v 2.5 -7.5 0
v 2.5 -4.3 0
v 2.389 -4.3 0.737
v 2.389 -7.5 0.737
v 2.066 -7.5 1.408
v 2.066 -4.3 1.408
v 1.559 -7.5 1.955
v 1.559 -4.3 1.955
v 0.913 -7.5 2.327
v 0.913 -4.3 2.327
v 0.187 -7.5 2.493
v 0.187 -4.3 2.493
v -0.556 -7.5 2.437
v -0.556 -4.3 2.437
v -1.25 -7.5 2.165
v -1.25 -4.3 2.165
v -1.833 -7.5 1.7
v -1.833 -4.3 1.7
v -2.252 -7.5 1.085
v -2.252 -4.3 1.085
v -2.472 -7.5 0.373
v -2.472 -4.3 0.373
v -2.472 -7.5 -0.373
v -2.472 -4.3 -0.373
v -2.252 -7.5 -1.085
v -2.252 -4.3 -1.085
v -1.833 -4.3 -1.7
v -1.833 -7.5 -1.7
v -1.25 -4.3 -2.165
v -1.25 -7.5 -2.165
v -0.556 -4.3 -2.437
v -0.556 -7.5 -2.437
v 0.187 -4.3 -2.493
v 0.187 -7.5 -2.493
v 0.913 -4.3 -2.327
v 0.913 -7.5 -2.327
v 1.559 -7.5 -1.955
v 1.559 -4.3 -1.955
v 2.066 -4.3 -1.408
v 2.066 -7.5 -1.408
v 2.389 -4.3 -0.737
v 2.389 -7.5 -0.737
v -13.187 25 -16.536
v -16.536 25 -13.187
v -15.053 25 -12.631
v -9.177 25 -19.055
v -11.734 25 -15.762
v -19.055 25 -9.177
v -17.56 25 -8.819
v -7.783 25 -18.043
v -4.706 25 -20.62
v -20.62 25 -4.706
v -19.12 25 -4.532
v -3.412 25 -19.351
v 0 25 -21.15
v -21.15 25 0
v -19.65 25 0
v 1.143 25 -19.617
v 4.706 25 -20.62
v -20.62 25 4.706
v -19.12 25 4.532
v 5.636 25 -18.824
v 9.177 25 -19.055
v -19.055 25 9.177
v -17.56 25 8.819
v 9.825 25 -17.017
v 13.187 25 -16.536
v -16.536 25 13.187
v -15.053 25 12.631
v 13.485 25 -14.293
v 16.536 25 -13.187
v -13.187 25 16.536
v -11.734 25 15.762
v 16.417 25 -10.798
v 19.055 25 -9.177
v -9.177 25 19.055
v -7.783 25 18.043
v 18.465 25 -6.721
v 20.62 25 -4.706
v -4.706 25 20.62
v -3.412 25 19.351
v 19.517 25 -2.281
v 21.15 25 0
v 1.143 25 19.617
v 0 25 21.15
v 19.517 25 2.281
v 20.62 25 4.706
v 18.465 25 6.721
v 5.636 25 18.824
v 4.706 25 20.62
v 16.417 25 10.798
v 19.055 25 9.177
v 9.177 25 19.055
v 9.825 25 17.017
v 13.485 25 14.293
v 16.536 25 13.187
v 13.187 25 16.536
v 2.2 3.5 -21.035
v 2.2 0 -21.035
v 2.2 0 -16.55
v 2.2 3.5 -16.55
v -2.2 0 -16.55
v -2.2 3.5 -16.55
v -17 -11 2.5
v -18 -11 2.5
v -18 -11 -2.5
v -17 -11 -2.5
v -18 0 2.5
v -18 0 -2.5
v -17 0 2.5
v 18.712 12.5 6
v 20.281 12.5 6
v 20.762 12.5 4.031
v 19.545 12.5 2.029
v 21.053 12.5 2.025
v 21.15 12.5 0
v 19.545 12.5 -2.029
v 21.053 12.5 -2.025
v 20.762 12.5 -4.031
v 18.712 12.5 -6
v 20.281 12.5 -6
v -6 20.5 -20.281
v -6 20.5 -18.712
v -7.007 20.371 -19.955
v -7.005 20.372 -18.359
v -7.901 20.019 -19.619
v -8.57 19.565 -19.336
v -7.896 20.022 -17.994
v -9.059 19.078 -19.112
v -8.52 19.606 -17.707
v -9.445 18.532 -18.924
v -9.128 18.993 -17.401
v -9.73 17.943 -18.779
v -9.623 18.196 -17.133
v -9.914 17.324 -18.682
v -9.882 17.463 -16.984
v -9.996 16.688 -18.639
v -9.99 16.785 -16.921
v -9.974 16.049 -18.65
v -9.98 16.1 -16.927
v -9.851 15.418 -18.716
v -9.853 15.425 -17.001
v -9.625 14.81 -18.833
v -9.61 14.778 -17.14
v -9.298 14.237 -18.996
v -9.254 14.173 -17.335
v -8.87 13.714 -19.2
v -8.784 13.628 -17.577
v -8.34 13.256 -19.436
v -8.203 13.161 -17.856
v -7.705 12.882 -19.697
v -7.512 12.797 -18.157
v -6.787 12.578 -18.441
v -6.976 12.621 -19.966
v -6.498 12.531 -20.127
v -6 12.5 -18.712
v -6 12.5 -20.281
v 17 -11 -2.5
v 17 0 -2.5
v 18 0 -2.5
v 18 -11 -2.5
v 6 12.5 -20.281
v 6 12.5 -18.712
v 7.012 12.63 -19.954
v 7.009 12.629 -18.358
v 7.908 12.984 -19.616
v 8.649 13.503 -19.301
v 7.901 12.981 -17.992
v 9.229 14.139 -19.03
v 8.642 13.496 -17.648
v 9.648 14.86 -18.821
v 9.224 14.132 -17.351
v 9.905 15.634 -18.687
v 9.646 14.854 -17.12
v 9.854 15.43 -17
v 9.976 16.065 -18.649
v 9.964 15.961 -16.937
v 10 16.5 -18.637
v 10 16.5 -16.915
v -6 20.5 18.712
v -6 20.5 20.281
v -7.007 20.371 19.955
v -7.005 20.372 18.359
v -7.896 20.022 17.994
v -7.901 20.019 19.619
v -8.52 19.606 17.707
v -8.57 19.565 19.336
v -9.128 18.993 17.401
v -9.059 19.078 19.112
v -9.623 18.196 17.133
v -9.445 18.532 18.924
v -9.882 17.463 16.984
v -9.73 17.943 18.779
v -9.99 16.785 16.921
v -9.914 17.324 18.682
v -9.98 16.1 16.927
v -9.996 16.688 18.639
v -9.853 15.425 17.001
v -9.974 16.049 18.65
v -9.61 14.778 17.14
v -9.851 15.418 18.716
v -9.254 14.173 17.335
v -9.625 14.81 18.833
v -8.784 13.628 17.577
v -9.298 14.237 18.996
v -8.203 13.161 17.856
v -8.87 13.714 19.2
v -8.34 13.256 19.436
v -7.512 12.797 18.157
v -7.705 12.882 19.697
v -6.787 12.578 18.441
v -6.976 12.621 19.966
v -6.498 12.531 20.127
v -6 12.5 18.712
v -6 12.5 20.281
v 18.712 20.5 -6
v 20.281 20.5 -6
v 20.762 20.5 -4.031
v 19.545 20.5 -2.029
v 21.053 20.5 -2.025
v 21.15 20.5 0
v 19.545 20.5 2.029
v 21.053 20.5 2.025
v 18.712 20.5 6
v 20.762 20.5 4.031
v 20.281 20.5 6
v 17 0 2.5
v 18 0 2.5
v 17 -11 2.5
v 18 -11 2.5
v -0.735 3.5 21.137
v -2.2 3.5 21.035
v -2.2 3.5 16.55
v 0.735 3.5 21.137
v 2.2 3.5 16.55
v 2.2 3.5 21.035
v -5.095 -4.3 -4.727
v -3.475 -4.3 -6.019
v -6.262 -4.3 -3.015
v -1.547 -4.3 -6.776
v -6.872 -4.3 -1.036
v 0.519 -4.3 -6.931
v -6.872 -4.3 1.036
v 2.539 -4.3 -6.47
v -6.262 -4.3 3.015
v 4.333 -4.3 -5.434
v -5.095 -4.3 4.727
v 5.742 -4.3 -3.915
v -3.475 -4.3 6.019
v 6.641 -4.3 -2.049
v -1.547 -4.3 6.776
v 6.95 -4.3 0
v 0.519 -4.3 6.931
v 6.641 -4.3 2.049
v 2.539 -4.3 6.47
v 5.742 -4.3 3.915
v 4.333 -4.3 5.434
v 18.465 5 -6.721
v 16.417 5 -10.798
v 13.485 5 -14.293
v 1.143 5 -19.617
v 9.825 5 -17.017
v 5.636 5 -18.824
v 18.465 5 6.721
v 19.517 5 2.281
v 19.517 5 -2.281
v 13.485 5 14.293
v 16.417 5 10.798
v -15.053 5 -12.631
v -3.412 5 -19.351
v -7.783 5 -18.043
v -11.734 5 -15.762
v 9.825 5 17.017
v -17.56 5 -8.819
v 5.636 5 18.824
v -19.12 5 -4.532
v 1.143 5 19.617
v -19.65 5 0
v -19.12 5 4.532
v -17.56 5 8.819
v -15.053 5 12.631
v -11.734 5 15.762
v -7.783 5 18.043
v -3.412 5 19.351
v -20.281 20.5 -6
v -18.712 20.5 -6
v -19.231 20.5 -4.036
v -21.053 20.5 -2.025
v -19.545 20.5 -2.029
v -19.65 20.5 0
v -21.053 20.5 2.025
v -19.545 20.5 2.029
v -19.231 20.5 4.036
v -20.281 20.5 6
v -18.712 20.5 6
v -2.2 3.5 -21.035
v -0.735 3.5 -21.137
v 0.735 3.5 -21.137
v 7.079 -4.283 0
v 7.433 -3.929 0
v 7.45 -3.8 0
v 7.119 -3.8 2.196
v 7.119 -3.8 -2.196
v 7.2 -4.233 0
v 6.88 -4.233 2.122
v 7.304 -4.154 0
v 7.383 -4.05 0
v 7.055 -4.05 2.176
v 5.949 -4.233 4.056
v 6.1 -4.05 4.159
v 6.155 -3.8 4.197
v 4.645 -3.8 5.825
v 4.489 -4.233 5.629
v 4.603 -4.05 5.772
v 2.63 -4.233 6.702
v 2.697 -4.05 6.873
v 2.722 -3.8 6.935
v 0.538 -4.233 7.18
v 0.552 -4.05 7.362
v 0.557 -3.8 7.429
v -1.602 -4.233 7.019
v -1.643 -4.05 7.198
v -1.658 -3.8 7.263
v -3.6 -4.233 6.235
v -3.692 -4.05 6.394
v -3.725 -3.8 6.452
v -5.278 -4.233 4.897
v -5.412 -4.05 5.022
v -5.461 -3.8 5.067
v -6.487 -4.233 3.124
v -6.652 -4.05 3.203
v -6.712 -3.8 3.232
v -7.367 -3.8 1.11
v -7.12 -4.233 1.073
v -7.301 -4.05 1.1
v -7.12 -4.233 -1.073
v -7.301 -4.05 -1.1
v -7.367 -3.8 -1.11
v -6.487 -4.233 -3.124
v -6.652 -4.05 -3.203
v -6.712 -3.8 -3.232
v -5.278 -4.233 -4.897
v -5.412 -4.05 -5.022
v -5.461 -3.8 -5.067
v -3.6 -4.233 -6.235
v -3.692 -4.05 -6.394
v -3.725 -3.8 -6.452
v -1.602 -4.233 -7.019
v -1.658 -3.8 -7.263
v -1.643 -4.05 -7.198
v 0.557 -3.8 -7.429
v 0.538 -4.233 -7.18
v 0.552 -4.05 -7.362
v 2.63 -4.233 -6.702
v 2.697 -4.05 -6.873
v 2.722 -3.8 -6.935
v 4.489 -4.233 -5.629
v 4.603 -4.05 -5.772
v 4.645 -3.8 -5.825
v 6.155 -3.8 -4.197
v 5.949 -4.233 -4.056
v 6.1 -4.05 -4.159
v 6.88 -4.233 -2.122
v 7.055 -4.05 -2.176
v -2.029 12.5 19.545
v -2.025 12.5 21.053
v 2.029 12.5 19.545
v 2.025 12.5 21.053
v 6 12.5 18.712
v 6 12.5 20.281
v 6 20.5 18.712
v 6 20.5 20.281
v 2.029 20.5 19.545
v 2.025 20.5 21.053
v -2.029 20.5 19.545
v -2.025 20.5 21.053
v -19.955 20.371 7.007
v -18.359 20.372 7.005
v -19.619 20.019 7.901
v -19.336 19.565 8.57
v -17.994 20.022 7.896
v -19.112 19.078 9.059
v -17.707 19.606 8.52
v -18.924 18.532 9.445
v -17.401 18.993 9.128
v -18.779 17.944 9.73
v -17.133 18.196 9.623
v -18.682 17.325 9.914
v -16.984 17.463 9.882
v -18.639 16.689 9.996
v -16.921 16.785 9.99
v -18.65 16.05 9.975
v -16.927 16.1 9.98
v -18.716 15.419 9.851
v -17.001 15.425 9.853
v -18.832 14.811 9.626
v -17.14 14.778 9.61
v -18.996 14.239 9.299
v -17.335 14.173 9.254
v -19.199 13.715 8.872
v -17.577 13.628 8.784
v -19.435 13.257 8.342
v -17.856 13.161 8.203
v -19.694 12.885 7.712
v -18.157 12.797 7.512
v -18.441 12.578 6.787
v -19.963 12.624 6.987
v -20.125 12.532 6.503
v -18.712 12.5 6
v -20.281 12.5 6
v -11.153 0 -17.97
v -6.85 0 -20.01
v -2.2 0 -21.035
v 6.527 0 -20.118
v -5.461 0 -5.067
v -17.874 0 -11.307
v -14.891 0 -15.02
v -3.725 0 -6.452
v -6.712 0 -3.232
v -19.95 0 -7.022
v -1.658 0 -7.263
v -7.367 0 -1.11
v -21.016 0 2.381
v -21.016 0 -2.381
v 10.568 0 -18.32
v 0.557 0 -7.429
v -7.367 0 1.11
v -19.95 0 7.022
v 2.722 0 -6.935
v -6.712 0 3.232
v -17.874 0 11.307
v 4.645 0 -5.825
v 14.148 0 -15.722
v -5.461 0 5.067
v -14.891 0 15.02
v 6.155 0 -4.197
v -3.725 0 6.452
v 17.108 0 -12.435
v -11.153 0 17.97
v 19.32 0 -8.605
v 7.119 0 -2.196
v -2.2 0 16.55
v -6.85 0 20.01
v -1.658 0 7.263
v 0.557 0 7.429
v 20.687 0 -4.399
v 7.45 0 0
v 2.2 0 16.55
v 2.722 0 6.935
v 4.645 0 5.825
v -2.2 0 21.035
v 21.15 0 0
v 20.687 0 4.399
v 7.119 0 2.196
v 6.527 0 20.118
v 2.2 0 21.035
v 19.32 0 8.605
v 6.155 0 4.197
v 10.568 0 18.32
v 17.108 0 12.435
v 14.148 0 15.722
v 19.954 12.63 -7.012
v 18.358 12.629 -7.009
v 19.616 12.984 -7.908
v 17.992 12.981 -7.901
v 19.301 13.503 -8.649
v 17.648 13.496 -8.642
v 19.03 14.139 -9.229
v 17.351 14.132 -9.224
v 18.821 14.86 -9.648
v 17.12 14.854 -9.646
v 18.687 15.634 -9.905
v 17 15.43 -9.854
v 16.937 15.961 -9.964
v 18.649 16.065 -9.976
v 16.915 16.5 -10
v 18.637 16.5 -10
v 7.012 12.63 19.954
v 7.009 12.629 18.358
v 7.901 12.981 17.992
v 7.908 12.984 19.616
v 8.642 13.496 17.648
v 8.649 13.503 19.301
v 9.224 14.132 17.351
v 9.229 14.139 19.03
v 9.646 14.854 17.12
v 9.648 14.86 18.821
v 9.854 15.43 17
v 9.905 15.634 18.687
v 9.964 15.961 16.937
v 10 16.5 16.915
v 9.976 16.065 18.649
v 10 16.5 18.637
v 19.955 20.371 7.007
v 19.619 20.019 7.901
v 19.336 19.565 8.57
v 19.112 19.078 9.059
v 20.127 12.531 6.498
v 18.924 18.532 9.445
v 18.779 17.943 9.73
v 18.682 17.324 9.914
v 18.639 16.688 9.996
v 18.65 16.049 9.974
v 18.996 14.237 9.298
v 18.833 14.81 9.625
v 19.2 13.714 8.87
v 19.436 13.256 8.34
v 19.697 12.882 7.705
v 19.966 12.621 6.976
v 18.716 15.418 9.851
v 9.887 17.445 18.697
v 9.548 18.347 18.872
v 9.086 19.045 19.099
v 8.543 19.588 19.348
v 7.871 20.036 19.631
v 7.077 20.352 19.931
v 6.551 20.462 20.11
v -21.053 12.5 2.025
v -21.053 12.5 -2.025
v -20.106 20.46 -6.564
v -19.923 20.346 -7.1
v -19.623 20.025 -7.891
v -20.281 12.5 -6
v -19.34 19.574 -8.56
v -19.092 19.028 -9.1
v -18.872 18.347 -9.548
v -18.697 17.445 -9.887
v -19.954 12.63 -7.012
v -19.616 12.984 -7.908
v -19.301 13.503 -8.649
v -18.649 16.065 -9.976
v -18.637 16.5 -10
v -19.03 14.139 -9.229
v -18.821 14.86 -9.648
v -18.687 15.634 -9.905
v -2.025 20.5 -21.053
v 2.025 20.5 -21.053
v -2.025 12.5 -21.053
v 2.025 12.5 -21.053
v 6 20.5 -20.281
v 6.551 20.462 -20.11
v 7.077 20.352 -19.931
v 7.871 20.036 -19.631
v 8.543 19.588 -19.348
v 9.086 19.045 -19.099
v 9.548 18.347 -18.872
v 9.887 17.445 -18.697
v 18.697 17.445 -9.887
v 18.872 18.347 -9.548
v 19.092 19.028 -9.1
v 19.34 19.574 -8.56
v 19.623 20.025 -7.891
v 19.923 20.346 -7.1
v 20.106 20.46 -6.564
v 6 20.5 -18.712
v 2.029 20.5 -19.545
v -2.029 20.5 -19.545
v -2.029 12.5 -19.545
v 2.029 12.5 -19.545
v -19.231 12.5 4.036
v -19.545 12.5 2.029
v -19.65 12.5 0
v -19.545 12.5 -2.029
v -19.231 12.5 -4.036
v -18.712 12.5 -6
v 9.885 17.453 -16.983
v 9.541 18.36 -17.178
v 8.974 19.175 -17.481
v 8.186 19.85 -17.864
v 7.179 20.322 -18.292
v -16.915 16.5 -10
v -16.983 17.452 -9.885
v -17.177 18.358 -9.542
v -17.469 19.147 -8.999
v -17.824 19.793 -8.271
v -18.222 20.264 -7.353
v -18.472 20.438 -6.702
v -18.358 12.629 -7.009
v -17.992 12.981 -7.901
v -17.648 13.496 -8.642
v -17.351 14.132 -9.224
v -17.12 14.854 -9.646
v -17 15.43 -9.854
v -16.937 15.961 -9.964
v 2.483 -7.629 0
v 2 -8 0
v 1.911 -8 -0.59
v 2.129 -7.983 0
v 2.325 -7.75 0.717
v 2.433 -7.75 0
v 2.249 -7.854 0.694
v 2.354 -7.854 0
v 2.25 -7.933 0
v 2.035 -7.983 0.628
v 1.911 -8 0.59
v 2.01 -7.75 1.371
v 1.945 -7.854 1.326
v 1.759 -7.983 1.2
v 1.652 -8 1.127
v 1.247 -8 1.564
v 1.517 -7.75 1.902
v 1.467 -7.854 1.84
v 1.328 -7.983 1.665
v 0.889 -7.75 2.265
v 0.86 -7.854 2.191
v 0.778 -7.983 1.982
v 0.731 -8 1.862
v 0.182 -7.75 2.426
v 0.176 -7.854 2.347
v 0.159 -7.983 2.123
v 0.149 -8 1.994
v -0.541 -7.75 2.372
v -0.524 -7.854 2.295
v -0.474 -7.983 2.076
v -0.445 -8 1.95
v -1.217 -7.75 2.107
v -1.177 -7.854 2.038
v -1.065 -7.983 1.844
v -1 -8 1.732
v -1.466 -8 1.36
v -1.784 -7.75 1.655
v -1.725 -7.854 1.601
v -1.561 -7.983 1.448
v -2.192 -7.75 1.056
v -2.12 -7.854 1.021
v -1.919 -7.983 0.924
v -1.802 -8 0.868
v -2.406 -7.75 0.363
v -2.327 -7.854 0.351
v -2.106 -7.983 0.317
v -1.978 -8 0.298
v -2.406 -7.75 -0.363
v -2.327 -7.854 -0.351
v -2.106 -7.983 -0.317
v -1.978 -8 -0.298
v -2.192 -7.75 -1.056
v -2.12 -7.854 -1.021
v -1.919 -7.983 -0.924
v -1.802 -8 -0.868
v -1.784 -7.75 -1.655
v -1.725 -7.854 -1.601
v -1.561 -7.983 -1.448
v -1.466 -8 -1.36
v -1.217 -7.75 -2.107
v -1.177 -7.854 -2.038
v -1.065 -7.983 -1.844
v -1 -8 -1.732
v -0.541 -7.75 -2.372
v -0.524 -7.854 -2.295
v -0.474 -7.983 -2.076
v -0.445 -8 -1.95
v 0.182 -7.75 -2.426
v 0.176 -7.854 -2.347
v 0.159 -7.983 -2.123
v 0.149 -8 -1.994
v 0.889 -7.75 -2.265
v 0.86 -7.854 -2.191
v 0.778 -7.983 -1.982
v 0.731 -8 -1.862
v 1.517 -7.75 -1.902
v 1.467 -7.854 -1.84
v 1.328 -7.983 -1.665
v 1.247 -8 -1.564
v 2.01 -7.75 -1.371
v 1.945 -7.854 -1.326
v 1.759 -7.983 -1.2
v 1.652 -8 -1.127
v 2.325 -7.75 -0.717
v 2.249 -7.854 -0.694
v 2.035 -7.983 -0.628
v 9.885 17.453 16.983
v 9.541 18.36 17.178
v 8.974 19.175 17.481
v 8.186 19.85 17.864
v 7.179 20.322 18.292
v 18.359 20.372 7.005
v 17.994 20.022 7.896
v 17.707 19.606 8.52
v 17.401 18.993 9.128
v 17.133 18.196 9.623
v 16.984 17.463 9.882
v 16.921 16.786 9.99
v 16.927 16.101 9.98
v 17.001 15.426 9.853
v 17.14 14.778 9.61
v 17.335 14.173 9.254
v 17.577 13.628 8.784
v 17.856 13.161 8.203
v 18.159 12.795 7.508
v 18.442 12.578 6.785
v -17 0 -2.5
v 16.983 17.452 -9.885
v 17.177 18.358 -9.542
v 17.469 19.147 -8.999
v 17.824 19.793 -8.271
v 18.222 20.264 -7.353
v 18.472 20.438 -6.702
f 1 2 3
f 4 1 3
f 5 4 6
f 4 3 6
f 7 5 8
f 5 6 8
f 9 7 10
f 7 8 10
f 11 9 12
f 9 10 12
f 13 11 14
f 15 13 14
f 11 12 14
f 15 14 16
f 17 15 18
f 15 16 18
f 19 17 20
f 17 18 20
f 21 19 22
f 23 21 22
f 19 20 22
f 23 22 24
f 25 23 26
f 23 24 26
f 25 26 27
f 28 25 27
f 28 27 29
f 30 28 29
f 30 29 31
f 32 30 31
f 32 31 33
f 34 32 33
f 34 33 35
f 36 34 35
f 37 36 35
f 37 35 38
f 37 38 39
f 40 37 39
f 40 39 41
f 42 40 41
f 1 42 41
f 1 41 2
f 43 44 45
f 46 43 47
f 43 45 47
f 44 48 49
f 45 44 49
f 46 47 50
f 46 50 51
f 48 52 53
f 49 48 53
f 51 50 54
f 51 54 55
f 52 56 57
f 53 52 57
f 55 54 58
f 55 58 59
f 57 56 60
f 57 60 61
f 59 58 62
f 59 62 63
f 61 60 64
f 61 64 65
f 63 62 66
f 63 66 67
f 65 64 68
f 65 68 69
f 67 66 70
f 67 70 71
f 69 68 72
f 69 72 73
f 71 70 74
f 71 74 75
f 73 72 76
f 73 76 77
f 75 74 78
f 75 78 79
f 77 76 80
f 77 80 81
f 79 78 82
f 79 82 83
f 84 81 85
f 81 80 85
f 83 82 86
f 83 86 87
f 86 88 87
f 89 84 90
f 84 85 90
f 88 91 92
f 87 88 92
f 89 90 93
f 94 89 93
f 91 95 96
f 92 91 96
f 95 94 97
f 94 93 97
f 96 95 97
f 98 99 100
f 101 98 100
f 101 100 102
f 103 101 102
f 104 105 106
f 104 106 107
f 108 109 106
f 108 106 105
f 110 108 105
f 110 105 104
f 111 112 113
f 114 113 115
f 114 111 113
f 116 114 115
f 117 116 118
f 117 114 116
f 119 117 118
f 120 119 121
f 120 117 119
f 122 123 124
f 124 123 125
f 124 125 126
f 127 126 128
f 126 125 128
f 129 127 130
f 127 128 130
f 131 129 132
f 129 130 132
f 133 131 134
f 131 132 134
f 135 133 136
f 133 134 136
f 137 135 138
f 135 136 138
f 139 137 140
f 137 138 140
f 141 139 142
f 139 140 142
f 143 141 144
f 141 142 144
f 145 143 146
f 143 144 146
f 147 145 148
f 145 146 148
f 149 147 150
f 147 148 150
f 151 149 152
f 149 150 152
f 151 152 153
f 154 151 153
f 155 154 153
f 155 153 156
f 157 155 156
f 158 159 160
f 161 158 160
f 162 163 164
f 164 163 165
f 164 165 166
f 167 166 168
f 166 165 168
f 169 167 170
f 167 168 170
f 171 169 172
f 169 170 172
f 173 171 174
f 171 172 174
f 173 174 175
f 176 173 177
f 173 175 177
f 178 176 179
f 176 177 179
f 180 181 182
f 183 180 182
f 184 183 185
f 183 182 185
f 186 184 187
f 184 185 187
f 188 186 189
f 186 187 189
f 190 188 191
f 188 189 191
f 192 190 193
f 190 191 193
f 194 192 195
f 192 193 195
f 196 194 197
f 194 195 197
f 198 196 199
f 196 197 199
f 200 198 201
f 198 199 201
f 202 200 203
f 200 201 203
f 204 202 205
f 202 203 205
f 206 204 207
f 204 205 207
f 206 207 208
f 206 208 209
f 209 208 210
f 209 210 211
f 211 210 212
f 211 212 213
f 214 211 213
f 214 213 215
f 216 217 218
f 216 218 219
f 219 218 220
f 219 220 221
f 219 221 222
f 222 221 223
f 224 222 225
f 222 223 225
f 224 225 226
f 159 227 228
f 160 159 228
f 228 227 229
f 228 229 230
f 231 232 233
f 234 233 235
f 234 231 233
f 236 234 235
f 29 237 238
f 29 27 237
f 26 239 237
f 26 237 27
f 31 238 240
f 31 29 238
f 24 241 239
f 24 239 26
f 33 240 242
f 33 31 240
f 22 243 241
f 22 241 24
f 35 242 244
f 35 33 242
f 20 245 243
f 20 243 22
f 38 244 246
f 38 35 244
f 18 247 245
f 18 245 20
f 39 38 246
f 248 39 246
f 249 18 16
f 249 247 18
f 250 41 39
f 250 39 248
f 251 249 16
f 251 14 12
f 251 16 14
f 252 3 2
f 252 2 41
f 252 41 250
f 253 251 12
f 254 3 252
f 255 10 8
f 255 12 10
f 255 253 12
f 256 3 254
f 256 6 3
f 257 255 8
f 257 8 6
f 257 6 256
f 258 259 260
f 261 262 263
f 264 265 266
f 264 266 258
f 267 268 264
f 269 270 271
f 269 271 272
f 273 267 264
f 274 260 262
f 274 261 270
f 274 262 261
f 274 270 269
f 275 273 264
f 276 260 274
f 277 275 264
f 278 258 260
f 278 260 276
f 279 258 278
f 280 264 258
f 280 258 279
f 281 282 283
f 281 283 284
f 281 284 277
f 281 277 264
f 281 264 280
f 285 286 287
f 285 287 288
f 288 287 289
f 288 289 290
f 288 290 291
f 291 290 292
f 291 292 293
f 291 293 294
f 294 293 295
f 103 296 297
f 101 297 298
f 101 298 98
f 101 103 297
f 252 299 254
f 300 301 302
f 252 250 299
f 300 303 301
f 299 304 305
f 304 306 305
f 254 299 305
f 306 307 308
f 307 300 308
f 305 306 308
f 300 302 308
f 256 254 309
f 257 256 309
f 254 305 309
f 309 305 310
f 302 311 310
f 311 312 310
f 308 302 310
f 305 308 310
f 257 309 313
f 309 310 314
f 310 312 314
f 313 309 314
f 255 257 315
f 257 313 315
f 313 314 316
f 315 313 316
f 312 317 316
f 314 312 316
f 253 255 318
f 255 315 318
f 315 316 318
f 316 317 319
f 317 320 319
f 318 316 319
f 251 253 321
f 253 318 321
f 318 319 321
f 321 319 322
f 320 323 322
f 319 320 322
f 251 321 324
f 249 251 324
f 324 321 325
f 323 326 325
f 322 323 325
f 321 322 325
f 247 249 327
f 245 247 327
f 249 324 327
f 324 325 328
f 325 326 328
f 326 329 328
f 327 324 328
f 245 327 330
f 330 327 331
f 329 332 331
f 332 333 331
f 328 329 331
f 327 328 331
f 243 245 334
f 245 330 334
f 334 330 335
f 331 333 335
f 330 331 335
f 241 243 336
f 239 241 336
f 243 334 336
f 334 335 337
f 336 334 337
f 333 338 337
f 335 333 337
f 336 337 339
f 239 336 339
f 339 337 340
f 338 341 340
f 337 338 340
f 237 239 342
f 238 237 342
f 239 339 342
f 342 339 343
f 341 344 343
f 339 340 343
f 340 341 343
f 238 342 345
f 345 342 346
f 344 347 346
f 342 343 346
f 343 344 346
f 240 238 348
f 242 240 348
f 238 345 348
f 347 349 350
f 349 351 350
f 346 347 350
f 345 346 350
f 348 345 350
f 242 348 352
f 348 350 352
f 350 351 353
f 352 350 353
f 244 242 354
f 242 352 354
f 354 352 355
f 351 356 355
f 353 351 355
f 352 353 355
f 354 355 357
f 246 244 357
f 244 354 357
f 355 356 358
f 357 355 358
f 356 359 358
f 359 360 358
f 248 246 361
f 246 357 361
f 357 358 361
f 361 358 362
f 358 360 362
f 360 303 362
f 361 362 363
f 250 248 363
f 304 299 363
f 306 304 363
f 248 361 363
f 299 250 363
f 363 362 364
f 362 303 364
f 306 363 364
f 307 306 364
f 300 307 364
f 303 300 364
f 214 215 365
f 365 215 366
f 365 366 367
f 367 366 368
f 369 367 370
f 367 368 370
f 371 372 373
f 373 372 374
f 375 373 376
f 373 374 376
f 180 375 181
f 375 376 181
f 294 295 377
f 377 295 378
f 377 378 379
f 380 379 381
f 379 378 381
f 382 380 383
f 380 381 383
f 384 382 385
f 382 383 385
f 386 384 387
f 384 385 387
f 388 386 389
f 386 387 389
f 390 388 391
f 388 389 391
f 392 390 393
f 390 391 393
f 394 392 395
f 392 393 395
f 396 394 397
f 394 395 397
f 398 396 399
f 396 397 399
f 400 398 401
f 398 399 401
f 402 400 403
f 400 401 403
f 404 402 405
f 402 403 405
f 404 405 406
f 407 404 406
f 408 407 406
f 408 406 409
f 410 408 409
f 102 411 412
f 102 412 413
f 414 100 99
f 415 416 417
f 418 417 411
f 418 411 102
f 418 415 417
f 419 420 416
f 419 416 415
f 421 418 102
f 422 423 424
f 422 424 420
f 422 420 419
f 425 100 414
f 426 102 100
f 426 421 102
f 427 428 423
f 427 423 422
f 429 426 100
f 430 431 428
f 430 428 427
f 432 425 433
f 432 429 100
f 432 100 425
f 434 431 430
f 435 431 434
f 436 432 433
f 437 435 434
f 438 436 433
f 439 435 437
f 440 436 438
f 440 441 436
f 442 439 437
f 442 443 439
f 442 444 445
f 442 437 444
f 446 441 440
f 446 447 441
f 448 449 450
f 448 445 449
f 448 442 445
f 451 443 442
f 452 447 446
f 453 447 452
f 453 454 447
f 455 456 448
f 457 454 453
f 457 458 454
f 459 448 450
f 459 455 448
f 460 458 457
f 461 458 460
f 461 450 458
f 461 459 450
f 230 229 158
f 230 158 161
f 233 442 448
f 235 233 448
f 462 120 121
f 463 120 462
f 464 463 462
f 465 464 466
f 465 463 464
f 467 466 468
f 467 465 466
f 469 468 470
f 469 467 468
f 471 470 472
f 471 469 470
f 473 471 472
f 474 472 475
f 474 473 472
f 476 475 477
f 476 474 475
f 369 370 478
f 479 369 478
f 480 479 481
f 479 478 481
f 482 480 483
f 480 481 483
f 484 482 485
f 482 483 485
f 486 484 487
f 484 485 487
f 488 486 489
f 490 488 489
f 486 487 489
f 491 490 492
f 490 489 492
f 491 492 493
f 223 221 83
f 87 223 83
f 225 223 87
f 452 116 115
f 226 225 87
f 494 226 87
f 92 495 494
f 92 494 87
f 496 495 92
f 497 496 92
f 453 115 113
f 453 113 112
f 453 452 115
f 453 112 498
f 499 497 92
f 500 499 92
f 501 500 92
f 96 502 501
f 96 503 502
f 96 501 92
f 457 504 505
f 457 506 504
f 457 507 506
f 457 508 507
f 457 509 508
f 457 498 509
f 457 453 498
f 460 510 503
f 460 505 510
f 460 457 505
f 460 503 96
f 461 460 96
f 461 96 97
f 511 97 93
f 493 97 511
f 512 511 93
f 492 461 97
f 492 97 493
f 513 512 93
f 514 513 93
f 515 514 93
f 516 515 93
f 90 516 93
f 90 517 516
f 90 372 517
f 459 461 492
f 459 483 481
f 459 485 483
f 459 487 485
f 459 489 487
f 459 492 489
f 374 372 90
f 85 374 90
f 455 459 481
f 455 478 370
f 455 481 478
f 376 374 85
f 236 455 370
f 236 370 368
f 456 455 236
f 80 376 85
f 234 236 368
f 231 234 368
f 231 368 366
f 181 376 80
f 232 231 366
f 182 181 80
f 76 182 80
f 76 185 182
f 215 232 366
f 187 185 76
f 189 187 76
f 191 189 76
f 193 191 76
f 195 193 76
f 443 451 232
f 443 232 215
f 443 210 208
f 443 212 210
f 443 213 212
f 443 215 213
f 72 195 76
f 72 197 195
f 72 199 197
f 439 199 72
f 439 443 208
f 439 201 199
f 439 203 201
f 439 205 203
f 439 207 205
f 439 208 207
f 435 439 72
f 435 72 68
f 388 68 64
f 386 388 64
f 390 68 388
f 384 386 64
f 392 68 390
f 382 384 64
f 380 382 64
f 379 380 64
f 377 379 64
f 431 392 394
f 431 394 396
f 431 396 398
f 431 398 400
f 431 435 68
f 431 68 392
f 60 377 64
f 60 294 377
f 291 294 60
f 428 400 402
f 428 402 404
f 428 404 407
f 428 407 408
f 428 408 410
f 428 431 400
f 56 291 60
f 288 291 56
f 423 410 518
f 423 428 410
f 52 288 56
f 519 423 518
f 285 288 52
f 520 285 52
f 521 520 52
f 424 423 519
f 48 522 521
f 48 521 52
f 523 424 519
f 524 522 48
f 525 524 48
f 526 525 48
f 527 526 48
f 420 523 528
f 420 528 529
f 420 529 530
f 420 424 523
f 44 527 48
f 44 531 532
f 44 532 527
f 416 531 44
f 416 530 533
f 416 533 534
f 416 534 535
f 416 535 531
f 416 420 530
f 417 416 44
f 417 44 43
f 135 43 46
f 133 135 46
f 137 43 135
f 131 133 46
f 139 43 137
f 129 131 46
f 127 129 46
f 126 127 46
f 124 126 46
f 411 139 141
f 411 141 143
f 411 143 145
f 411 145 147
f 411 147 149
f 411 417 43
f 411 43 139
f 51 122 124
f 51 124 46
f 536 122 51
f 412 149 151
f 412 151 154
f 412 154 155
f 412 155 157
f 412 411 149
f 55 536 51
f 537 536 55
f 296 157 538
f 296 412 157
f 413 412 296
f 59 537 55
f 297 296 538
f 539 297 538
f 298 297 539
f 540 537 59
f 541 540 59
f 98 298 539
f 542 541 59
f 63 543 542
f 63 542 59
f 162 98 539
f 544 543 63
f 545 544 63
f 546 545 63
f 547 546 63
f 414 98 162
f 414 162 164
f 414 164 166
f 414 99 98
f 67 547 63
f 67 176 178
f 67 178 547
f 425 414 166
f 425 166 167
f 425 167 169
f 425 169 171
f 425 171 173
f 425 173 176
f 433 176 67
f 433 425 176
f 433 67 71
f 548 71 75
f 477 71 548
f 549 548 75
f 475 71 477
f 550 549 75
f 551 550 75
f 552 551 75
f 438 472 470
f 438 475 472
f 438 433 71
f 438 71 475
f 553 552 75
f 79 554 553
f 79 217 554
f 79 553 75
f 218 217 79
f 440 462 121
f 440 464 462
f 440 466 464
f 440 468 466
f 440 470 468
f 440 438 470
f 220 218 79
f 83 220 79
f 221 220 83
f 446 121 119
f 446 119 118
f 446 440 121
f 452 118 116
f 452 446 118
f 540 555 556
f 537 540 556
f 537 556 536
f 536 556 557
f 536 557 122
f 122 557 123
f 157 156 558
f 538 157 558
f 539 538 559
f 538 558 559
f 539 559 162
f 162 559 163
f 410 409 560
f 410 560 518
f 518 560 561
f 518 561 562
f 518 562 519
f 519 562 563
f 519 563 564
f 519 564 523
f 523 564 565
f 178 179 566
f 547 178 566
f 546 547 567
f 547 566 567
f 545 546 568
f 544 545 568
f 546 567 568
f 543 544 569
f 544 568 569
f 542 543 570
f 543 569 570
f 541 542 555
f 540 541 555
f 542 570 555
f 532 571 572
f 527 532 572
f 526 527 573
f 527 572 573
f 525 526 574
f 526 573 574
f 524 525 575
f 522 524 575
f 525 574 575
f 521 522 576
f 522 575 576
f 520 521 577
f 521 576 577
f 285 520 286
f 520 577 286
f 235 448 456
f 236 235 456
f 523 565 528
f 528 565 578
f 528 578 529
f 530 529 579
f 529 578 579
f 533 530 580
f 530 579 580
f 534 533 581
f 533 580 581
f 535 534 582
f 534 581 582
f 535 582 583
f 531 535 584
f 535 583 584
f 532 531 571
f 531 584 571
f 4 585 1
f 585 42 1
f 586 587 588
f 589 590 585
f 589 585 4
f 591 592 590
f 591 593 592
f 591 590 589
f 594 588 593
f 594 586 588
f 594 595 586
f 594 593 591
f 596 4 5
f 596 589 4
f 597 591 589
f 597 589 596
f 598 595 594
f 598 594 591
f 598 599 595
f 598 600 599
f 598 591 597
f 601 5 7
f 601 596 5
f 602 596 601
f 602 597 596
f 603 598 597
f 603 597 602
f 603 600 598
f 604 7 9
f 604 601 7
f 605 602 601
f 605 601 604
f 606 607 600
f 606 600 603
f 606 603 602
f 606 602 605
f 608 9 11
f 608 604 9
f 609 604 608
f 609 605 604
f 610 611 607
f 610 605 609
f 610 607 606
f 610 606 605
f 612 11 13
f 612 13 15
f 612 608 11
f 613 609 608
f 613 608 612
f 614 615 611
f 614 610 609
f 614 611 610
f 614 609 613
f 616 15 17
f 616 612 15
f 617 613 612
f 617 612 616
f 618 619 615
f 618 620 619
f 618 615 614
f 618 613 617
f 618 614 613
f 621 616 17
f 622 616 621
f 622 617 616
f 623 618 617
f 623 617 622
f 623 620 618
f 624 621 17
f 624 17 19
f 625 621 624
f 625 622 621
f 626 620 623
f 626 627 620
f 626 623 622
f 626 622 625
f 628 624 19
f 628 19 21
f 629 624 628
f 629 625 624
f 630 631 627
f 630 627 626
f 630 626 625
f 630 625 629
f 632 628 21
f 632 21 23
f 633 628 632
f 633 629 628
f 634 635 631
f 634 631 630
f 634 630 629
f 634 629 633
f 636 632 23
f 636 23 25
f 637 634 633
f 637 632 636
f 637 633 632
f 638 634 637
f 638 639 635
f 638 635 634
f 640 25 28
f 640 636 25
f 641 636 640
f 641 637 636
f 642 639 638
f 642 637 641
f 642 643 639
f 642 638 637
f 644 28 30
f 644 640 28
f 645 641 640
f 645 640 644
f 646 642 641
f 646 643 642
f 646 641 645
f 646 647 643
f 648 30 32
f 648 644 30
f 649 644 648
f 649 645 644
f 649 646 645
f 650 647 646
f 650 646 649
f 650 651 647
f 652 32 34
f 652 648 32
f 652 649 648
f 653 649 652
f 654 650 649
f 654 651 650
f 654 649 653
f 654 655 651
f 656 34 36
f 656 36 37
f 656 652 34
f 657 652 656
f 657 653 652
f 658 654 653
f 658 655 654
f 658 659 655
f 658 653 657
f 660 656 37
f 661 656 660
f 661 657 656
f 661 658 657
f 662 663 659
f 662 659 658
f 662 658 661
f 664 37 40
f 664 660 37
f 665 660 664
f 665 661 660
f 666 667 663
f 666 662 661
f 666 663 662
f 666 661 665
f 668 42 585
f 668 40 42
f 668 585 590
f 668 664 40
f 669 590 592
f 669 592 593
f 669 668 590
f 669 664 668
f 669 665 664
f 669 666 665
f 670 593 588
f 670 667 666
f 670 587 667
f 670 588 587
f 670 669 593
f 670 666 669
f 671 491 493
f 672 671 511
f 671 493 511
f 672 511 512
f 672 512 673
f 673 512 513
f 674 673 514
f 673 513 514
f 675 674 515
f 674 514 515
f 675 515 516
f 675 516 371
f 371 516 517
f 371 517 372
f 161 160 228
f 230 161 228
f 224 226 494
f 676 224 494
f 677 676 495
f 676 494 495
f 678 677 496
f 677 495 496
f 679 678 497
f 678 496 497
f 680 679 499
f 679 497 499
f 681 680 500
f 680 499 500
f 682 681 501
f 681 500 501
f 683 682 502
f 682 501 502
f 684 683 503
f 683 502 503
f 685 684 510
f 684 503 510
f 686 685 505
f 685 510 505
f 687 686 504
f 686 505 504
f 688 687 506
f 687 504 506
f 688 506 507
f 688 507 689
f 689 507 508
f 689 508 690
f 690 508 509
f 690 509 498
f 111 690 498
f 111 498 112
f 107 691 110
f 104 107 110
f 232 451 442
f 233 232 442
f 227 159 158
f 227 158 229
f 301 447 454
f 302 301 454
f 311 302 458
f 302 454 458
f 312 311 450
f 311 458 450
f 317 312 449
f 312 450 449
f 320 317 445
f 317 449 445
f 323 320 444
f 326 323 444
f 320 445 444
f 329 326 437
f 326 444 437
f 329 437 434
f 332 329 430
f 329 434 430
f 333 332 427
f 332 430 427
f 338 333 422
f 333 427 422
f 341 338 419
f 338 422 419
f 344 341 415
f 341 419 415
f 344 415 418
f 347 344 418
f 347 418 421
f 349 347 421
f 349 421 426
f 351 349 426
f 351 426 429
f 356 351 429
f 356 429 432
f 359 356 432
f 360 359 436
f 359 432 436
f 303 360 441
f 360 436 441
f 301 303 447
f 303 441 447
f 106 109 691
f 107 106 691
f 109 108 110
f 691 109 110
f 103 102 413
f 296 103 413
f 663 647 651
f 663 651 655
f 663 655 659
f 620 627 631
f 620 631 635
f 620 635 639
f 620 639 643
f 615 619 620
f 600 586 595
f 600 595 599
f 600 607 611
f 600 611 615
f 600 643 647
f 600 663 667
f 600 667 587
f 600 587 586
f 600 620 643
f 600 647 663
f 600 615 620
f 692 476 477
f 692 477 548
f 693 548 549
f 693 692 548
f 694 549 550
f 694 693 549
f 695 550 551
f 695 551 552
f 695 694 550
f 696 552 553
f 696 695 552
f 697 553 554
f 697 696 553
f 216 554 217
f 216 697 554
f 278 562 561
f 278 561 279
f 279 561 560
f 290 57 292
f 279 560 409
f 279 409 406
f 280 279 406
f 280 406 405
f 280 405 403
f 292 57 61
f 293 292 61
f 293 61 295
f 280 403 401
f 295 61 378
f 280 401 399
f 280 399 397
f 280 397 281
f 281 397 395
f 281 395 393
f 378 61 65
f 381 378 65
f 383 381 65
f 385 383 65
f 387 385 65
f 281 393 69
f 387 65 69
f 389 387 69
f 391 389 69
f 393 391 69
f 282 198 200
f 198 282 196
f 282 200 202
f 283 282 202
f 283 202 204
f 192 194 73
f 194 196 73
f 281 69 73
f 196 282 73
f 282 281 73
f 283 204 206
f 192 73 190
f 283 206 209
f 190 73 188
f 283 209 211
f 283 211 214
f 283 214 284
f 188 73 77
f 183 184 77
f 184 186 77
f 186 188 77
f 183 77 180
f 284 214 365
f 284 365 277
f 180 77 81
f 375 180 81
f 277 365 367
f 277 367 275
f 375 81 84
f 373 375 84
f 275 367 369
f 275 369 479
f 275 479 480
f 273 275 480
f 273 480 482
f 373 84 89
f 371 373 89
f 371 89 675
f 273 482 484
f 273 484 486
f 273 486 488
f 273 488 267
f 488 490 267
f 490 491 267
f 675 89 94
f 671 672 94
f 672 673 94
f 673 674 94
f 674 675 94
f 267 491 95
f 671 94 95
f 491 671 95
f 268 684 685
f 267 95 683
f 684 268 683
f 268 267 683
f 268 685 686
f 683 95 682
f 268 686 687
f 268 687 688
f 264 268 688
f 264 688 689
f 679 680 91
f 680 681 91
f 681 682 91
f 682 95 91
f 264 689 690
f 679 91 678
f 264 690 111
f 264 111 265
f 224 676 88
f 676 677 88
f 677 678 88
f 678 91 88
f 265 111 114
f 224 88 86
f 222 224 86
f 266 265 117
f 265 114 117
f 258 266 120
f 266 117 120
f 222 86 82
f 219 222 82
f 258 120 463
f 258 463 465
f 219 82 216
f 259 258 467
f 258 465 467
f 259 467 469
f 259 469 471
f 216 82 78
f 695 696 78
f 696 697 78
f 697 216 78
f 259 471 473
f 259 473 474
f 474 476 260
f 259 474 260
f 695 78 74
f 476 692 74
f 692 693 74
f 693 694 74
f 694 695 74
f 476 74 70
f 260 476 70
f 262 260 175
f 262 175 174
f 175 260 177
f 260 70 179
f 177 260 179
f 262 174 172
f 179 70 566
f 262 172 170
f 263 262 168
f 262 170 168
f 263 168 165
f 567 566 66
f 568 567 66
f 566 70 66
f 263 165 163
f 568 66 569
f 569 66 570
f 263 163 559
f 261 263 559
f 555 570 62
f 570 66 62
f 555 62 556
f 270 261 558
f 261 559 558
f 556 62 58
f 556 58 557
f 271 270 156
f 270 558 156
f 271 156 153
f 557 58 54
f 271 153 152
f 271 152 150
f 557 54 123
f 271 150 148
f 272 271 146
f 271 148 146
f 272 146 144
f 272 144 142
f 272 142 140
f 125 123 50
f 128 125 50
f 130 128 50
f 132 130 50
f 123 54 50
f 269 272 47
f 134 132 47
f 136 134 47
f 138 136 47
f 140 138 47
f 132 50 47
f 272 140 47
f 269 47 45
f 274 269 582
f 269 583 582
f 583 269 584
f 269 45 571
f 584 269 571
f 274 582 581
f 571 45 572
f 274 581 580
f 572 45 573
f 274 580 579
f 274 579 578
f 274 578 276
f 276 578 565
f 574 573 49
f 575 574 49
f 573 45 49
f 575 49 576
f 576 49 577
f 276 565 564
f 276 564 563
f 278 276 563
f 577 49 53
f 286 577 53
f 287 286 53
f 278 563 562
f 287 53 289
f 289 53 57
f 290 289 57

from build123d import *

# Parameters (mm, degrees)
F0_W      = 1
F0_H      = 5
F1_DEPTH  = 11
F0_R      = 21.15
F2_DEPTH  = 25
F3_R      = 19.65
F4_DEPTH  = 20
F6_DEPTH  = 22.5
F8_DEPTH  = 22.5
F10_DEPTH = 3.5
F11_R     = 7.45
F11_R_2   = 2.5
F12_DEPTH = 4.3
F13_DEPTH = 8
F14_R     = 0.5


with BuildPart() as f1:
    # F0 (on Front) → F1 (new body)
    with BuildSketch(Plane.XZ):
        with Locations((17.5, 0)):
            Rectangle(F0_W, F0_H)
    extrude(amount=F1_DEPTH)


with BuildPart() as f1b:
    # F0 (on Front) → F1, piece 2 (new body)
    with BuildSketch(Plane.XZ):
        with Locations((-17.5, 0)):
            Rectangle(F0_W, F0_H)
    extrude(amount=F1_DEPTH)


with BuildPart() as f2:
    # F0 (on Front) → F2 (new body)
    with BuildSketch(Plane.XZ):
        Circle(F0_R)
        with Locations((-17.5, 0)):
            Rectangle(F0_W, F0_H, mode=Mode.SUBTRACT)
        with Locations((17.5, 0)):
            Rectangle(F0_W, F0_H, mode=Mode.SUBTRACT)
        with Locations((-17.5, 0)):
            Rectangle(F0_W, F0_H)
        with Locations((17.5, 0)):
            Rectangle(F0_W, F0_H)
    extrude(amount=-F2_DEPTH)

    # F3 (on face) → F4 (cut)
    with BuildSketch(Plane(origin=(0, 25, 0), x_dir=(-1, 0, 0), z_dir=(0, 1, 0))):
        Circle(F3_R)
    extrude(amount=-F4_DEPTH, mode=Mode.SUBTRACT)

    # F5 (on Right) → F6 (cut, symmetric)
    with BuildSketch(Plane.YZ):
        with BuildLine():
            ThreePointArc((20.5, 6), (19.3284271247, 8.8284271247), (16.5, 10))
            ThreePointArc((16.5, 10), (13.6715728753, 8.8284271247), (12.5, 6))
            Line((12.5, 6), (12.5, -6))
            ThreePointArc((12.5, -6), (13.6715728753, -8.8284271247), (16.5, -10))
            ThreePointArc((16.5, -10), (19.3284271247, -8.8284271247), (20.5, -6))
            Line((20.5, -6), (20.5, 6))
        make_face()
    extrude(amount=F6_DEPTH, both=True, mode=Mode.SUBTRACT)

    # F7 (on Top) → F8 (cut, symmetric)
    with BuildSketch(Plane.XY):
        with BuildLine():
            Line((6, 20.5), (-6, 20.5))
            ThreePointArc((-6, 20.5), (-8.8284271247, 19.3284271247), (-10, 16.5))
            ThreePointArc((-10, 16.5), (-8.8284271247, 13.6715728753), (-6, 12.5))
            Line((-6, 12.5), (6, 12.5))
            ThreePointArc((6, 12.5), (8.8284271247, 13.6715728753), (10, 16.5))
            ThreePointArc((10, 16.5), (8.8284271247, 19.3284271247), (6, 20.5))
        make_face()
    extrude(amount=F8_DEPTH, both=True, mode=Mode.SUBTRACT)

    # F9 (on face) → F10 (cut)
    with BuildSketch(Plane.XZ):
        with BuildLine():
            Line((2.2, 16.55), (2.2, 21.035268004))
            ThreePointArc((2.2, 21.035268004), (0, 21.15), (-2.2, 21.035268004))
            Line((-2.2, 21.035268004), (-2.2, 16.55))
            Line((-2.2, 16.55), (2.2, 16.55))
        make_face()
        with BuildLine():
            ThreePointArc((-2.2, -21.035268004), (0, -21.15), (2.2, -21.035268004))
            Line((2.2, -21.035268004), (2.2, -16.55))
            Line((2.2, -16.55), (-2.2, -16.55))
            Line((-2.2, -16.55), (-2.2, -21.035268004))
        make_face()
    extrude(amount=-F10_DEPTH, mode=Mode.SUBTRACT)

    # F11 (on face) → F12 (join)
    with BuildSketch(Plane.XZ):
        Circle(F11_R)
        Circle(F11_R_2, mode=Mode.SUBTRACT)
    extrude(amount=F12_DEPTH)

    # F13 (add): a face of the model
    f13_faces = [f2.faces().sort_by_distance(p)[0] for p in [
        (0, 0, 0),
    ]]
    extrude(f13_faces, amount=F13_DEPTH)

    # F14
    f14_edges = [f2.edges().sort_by_distance(p)[0] for p in [
        (-7.45, -4.3, 0),
        (-2.5, -8, 0),
    ]]
    fillet(f14_edges, radius=F14_R)


solid = Compound([f1.part, f1b.part, f2.part])
